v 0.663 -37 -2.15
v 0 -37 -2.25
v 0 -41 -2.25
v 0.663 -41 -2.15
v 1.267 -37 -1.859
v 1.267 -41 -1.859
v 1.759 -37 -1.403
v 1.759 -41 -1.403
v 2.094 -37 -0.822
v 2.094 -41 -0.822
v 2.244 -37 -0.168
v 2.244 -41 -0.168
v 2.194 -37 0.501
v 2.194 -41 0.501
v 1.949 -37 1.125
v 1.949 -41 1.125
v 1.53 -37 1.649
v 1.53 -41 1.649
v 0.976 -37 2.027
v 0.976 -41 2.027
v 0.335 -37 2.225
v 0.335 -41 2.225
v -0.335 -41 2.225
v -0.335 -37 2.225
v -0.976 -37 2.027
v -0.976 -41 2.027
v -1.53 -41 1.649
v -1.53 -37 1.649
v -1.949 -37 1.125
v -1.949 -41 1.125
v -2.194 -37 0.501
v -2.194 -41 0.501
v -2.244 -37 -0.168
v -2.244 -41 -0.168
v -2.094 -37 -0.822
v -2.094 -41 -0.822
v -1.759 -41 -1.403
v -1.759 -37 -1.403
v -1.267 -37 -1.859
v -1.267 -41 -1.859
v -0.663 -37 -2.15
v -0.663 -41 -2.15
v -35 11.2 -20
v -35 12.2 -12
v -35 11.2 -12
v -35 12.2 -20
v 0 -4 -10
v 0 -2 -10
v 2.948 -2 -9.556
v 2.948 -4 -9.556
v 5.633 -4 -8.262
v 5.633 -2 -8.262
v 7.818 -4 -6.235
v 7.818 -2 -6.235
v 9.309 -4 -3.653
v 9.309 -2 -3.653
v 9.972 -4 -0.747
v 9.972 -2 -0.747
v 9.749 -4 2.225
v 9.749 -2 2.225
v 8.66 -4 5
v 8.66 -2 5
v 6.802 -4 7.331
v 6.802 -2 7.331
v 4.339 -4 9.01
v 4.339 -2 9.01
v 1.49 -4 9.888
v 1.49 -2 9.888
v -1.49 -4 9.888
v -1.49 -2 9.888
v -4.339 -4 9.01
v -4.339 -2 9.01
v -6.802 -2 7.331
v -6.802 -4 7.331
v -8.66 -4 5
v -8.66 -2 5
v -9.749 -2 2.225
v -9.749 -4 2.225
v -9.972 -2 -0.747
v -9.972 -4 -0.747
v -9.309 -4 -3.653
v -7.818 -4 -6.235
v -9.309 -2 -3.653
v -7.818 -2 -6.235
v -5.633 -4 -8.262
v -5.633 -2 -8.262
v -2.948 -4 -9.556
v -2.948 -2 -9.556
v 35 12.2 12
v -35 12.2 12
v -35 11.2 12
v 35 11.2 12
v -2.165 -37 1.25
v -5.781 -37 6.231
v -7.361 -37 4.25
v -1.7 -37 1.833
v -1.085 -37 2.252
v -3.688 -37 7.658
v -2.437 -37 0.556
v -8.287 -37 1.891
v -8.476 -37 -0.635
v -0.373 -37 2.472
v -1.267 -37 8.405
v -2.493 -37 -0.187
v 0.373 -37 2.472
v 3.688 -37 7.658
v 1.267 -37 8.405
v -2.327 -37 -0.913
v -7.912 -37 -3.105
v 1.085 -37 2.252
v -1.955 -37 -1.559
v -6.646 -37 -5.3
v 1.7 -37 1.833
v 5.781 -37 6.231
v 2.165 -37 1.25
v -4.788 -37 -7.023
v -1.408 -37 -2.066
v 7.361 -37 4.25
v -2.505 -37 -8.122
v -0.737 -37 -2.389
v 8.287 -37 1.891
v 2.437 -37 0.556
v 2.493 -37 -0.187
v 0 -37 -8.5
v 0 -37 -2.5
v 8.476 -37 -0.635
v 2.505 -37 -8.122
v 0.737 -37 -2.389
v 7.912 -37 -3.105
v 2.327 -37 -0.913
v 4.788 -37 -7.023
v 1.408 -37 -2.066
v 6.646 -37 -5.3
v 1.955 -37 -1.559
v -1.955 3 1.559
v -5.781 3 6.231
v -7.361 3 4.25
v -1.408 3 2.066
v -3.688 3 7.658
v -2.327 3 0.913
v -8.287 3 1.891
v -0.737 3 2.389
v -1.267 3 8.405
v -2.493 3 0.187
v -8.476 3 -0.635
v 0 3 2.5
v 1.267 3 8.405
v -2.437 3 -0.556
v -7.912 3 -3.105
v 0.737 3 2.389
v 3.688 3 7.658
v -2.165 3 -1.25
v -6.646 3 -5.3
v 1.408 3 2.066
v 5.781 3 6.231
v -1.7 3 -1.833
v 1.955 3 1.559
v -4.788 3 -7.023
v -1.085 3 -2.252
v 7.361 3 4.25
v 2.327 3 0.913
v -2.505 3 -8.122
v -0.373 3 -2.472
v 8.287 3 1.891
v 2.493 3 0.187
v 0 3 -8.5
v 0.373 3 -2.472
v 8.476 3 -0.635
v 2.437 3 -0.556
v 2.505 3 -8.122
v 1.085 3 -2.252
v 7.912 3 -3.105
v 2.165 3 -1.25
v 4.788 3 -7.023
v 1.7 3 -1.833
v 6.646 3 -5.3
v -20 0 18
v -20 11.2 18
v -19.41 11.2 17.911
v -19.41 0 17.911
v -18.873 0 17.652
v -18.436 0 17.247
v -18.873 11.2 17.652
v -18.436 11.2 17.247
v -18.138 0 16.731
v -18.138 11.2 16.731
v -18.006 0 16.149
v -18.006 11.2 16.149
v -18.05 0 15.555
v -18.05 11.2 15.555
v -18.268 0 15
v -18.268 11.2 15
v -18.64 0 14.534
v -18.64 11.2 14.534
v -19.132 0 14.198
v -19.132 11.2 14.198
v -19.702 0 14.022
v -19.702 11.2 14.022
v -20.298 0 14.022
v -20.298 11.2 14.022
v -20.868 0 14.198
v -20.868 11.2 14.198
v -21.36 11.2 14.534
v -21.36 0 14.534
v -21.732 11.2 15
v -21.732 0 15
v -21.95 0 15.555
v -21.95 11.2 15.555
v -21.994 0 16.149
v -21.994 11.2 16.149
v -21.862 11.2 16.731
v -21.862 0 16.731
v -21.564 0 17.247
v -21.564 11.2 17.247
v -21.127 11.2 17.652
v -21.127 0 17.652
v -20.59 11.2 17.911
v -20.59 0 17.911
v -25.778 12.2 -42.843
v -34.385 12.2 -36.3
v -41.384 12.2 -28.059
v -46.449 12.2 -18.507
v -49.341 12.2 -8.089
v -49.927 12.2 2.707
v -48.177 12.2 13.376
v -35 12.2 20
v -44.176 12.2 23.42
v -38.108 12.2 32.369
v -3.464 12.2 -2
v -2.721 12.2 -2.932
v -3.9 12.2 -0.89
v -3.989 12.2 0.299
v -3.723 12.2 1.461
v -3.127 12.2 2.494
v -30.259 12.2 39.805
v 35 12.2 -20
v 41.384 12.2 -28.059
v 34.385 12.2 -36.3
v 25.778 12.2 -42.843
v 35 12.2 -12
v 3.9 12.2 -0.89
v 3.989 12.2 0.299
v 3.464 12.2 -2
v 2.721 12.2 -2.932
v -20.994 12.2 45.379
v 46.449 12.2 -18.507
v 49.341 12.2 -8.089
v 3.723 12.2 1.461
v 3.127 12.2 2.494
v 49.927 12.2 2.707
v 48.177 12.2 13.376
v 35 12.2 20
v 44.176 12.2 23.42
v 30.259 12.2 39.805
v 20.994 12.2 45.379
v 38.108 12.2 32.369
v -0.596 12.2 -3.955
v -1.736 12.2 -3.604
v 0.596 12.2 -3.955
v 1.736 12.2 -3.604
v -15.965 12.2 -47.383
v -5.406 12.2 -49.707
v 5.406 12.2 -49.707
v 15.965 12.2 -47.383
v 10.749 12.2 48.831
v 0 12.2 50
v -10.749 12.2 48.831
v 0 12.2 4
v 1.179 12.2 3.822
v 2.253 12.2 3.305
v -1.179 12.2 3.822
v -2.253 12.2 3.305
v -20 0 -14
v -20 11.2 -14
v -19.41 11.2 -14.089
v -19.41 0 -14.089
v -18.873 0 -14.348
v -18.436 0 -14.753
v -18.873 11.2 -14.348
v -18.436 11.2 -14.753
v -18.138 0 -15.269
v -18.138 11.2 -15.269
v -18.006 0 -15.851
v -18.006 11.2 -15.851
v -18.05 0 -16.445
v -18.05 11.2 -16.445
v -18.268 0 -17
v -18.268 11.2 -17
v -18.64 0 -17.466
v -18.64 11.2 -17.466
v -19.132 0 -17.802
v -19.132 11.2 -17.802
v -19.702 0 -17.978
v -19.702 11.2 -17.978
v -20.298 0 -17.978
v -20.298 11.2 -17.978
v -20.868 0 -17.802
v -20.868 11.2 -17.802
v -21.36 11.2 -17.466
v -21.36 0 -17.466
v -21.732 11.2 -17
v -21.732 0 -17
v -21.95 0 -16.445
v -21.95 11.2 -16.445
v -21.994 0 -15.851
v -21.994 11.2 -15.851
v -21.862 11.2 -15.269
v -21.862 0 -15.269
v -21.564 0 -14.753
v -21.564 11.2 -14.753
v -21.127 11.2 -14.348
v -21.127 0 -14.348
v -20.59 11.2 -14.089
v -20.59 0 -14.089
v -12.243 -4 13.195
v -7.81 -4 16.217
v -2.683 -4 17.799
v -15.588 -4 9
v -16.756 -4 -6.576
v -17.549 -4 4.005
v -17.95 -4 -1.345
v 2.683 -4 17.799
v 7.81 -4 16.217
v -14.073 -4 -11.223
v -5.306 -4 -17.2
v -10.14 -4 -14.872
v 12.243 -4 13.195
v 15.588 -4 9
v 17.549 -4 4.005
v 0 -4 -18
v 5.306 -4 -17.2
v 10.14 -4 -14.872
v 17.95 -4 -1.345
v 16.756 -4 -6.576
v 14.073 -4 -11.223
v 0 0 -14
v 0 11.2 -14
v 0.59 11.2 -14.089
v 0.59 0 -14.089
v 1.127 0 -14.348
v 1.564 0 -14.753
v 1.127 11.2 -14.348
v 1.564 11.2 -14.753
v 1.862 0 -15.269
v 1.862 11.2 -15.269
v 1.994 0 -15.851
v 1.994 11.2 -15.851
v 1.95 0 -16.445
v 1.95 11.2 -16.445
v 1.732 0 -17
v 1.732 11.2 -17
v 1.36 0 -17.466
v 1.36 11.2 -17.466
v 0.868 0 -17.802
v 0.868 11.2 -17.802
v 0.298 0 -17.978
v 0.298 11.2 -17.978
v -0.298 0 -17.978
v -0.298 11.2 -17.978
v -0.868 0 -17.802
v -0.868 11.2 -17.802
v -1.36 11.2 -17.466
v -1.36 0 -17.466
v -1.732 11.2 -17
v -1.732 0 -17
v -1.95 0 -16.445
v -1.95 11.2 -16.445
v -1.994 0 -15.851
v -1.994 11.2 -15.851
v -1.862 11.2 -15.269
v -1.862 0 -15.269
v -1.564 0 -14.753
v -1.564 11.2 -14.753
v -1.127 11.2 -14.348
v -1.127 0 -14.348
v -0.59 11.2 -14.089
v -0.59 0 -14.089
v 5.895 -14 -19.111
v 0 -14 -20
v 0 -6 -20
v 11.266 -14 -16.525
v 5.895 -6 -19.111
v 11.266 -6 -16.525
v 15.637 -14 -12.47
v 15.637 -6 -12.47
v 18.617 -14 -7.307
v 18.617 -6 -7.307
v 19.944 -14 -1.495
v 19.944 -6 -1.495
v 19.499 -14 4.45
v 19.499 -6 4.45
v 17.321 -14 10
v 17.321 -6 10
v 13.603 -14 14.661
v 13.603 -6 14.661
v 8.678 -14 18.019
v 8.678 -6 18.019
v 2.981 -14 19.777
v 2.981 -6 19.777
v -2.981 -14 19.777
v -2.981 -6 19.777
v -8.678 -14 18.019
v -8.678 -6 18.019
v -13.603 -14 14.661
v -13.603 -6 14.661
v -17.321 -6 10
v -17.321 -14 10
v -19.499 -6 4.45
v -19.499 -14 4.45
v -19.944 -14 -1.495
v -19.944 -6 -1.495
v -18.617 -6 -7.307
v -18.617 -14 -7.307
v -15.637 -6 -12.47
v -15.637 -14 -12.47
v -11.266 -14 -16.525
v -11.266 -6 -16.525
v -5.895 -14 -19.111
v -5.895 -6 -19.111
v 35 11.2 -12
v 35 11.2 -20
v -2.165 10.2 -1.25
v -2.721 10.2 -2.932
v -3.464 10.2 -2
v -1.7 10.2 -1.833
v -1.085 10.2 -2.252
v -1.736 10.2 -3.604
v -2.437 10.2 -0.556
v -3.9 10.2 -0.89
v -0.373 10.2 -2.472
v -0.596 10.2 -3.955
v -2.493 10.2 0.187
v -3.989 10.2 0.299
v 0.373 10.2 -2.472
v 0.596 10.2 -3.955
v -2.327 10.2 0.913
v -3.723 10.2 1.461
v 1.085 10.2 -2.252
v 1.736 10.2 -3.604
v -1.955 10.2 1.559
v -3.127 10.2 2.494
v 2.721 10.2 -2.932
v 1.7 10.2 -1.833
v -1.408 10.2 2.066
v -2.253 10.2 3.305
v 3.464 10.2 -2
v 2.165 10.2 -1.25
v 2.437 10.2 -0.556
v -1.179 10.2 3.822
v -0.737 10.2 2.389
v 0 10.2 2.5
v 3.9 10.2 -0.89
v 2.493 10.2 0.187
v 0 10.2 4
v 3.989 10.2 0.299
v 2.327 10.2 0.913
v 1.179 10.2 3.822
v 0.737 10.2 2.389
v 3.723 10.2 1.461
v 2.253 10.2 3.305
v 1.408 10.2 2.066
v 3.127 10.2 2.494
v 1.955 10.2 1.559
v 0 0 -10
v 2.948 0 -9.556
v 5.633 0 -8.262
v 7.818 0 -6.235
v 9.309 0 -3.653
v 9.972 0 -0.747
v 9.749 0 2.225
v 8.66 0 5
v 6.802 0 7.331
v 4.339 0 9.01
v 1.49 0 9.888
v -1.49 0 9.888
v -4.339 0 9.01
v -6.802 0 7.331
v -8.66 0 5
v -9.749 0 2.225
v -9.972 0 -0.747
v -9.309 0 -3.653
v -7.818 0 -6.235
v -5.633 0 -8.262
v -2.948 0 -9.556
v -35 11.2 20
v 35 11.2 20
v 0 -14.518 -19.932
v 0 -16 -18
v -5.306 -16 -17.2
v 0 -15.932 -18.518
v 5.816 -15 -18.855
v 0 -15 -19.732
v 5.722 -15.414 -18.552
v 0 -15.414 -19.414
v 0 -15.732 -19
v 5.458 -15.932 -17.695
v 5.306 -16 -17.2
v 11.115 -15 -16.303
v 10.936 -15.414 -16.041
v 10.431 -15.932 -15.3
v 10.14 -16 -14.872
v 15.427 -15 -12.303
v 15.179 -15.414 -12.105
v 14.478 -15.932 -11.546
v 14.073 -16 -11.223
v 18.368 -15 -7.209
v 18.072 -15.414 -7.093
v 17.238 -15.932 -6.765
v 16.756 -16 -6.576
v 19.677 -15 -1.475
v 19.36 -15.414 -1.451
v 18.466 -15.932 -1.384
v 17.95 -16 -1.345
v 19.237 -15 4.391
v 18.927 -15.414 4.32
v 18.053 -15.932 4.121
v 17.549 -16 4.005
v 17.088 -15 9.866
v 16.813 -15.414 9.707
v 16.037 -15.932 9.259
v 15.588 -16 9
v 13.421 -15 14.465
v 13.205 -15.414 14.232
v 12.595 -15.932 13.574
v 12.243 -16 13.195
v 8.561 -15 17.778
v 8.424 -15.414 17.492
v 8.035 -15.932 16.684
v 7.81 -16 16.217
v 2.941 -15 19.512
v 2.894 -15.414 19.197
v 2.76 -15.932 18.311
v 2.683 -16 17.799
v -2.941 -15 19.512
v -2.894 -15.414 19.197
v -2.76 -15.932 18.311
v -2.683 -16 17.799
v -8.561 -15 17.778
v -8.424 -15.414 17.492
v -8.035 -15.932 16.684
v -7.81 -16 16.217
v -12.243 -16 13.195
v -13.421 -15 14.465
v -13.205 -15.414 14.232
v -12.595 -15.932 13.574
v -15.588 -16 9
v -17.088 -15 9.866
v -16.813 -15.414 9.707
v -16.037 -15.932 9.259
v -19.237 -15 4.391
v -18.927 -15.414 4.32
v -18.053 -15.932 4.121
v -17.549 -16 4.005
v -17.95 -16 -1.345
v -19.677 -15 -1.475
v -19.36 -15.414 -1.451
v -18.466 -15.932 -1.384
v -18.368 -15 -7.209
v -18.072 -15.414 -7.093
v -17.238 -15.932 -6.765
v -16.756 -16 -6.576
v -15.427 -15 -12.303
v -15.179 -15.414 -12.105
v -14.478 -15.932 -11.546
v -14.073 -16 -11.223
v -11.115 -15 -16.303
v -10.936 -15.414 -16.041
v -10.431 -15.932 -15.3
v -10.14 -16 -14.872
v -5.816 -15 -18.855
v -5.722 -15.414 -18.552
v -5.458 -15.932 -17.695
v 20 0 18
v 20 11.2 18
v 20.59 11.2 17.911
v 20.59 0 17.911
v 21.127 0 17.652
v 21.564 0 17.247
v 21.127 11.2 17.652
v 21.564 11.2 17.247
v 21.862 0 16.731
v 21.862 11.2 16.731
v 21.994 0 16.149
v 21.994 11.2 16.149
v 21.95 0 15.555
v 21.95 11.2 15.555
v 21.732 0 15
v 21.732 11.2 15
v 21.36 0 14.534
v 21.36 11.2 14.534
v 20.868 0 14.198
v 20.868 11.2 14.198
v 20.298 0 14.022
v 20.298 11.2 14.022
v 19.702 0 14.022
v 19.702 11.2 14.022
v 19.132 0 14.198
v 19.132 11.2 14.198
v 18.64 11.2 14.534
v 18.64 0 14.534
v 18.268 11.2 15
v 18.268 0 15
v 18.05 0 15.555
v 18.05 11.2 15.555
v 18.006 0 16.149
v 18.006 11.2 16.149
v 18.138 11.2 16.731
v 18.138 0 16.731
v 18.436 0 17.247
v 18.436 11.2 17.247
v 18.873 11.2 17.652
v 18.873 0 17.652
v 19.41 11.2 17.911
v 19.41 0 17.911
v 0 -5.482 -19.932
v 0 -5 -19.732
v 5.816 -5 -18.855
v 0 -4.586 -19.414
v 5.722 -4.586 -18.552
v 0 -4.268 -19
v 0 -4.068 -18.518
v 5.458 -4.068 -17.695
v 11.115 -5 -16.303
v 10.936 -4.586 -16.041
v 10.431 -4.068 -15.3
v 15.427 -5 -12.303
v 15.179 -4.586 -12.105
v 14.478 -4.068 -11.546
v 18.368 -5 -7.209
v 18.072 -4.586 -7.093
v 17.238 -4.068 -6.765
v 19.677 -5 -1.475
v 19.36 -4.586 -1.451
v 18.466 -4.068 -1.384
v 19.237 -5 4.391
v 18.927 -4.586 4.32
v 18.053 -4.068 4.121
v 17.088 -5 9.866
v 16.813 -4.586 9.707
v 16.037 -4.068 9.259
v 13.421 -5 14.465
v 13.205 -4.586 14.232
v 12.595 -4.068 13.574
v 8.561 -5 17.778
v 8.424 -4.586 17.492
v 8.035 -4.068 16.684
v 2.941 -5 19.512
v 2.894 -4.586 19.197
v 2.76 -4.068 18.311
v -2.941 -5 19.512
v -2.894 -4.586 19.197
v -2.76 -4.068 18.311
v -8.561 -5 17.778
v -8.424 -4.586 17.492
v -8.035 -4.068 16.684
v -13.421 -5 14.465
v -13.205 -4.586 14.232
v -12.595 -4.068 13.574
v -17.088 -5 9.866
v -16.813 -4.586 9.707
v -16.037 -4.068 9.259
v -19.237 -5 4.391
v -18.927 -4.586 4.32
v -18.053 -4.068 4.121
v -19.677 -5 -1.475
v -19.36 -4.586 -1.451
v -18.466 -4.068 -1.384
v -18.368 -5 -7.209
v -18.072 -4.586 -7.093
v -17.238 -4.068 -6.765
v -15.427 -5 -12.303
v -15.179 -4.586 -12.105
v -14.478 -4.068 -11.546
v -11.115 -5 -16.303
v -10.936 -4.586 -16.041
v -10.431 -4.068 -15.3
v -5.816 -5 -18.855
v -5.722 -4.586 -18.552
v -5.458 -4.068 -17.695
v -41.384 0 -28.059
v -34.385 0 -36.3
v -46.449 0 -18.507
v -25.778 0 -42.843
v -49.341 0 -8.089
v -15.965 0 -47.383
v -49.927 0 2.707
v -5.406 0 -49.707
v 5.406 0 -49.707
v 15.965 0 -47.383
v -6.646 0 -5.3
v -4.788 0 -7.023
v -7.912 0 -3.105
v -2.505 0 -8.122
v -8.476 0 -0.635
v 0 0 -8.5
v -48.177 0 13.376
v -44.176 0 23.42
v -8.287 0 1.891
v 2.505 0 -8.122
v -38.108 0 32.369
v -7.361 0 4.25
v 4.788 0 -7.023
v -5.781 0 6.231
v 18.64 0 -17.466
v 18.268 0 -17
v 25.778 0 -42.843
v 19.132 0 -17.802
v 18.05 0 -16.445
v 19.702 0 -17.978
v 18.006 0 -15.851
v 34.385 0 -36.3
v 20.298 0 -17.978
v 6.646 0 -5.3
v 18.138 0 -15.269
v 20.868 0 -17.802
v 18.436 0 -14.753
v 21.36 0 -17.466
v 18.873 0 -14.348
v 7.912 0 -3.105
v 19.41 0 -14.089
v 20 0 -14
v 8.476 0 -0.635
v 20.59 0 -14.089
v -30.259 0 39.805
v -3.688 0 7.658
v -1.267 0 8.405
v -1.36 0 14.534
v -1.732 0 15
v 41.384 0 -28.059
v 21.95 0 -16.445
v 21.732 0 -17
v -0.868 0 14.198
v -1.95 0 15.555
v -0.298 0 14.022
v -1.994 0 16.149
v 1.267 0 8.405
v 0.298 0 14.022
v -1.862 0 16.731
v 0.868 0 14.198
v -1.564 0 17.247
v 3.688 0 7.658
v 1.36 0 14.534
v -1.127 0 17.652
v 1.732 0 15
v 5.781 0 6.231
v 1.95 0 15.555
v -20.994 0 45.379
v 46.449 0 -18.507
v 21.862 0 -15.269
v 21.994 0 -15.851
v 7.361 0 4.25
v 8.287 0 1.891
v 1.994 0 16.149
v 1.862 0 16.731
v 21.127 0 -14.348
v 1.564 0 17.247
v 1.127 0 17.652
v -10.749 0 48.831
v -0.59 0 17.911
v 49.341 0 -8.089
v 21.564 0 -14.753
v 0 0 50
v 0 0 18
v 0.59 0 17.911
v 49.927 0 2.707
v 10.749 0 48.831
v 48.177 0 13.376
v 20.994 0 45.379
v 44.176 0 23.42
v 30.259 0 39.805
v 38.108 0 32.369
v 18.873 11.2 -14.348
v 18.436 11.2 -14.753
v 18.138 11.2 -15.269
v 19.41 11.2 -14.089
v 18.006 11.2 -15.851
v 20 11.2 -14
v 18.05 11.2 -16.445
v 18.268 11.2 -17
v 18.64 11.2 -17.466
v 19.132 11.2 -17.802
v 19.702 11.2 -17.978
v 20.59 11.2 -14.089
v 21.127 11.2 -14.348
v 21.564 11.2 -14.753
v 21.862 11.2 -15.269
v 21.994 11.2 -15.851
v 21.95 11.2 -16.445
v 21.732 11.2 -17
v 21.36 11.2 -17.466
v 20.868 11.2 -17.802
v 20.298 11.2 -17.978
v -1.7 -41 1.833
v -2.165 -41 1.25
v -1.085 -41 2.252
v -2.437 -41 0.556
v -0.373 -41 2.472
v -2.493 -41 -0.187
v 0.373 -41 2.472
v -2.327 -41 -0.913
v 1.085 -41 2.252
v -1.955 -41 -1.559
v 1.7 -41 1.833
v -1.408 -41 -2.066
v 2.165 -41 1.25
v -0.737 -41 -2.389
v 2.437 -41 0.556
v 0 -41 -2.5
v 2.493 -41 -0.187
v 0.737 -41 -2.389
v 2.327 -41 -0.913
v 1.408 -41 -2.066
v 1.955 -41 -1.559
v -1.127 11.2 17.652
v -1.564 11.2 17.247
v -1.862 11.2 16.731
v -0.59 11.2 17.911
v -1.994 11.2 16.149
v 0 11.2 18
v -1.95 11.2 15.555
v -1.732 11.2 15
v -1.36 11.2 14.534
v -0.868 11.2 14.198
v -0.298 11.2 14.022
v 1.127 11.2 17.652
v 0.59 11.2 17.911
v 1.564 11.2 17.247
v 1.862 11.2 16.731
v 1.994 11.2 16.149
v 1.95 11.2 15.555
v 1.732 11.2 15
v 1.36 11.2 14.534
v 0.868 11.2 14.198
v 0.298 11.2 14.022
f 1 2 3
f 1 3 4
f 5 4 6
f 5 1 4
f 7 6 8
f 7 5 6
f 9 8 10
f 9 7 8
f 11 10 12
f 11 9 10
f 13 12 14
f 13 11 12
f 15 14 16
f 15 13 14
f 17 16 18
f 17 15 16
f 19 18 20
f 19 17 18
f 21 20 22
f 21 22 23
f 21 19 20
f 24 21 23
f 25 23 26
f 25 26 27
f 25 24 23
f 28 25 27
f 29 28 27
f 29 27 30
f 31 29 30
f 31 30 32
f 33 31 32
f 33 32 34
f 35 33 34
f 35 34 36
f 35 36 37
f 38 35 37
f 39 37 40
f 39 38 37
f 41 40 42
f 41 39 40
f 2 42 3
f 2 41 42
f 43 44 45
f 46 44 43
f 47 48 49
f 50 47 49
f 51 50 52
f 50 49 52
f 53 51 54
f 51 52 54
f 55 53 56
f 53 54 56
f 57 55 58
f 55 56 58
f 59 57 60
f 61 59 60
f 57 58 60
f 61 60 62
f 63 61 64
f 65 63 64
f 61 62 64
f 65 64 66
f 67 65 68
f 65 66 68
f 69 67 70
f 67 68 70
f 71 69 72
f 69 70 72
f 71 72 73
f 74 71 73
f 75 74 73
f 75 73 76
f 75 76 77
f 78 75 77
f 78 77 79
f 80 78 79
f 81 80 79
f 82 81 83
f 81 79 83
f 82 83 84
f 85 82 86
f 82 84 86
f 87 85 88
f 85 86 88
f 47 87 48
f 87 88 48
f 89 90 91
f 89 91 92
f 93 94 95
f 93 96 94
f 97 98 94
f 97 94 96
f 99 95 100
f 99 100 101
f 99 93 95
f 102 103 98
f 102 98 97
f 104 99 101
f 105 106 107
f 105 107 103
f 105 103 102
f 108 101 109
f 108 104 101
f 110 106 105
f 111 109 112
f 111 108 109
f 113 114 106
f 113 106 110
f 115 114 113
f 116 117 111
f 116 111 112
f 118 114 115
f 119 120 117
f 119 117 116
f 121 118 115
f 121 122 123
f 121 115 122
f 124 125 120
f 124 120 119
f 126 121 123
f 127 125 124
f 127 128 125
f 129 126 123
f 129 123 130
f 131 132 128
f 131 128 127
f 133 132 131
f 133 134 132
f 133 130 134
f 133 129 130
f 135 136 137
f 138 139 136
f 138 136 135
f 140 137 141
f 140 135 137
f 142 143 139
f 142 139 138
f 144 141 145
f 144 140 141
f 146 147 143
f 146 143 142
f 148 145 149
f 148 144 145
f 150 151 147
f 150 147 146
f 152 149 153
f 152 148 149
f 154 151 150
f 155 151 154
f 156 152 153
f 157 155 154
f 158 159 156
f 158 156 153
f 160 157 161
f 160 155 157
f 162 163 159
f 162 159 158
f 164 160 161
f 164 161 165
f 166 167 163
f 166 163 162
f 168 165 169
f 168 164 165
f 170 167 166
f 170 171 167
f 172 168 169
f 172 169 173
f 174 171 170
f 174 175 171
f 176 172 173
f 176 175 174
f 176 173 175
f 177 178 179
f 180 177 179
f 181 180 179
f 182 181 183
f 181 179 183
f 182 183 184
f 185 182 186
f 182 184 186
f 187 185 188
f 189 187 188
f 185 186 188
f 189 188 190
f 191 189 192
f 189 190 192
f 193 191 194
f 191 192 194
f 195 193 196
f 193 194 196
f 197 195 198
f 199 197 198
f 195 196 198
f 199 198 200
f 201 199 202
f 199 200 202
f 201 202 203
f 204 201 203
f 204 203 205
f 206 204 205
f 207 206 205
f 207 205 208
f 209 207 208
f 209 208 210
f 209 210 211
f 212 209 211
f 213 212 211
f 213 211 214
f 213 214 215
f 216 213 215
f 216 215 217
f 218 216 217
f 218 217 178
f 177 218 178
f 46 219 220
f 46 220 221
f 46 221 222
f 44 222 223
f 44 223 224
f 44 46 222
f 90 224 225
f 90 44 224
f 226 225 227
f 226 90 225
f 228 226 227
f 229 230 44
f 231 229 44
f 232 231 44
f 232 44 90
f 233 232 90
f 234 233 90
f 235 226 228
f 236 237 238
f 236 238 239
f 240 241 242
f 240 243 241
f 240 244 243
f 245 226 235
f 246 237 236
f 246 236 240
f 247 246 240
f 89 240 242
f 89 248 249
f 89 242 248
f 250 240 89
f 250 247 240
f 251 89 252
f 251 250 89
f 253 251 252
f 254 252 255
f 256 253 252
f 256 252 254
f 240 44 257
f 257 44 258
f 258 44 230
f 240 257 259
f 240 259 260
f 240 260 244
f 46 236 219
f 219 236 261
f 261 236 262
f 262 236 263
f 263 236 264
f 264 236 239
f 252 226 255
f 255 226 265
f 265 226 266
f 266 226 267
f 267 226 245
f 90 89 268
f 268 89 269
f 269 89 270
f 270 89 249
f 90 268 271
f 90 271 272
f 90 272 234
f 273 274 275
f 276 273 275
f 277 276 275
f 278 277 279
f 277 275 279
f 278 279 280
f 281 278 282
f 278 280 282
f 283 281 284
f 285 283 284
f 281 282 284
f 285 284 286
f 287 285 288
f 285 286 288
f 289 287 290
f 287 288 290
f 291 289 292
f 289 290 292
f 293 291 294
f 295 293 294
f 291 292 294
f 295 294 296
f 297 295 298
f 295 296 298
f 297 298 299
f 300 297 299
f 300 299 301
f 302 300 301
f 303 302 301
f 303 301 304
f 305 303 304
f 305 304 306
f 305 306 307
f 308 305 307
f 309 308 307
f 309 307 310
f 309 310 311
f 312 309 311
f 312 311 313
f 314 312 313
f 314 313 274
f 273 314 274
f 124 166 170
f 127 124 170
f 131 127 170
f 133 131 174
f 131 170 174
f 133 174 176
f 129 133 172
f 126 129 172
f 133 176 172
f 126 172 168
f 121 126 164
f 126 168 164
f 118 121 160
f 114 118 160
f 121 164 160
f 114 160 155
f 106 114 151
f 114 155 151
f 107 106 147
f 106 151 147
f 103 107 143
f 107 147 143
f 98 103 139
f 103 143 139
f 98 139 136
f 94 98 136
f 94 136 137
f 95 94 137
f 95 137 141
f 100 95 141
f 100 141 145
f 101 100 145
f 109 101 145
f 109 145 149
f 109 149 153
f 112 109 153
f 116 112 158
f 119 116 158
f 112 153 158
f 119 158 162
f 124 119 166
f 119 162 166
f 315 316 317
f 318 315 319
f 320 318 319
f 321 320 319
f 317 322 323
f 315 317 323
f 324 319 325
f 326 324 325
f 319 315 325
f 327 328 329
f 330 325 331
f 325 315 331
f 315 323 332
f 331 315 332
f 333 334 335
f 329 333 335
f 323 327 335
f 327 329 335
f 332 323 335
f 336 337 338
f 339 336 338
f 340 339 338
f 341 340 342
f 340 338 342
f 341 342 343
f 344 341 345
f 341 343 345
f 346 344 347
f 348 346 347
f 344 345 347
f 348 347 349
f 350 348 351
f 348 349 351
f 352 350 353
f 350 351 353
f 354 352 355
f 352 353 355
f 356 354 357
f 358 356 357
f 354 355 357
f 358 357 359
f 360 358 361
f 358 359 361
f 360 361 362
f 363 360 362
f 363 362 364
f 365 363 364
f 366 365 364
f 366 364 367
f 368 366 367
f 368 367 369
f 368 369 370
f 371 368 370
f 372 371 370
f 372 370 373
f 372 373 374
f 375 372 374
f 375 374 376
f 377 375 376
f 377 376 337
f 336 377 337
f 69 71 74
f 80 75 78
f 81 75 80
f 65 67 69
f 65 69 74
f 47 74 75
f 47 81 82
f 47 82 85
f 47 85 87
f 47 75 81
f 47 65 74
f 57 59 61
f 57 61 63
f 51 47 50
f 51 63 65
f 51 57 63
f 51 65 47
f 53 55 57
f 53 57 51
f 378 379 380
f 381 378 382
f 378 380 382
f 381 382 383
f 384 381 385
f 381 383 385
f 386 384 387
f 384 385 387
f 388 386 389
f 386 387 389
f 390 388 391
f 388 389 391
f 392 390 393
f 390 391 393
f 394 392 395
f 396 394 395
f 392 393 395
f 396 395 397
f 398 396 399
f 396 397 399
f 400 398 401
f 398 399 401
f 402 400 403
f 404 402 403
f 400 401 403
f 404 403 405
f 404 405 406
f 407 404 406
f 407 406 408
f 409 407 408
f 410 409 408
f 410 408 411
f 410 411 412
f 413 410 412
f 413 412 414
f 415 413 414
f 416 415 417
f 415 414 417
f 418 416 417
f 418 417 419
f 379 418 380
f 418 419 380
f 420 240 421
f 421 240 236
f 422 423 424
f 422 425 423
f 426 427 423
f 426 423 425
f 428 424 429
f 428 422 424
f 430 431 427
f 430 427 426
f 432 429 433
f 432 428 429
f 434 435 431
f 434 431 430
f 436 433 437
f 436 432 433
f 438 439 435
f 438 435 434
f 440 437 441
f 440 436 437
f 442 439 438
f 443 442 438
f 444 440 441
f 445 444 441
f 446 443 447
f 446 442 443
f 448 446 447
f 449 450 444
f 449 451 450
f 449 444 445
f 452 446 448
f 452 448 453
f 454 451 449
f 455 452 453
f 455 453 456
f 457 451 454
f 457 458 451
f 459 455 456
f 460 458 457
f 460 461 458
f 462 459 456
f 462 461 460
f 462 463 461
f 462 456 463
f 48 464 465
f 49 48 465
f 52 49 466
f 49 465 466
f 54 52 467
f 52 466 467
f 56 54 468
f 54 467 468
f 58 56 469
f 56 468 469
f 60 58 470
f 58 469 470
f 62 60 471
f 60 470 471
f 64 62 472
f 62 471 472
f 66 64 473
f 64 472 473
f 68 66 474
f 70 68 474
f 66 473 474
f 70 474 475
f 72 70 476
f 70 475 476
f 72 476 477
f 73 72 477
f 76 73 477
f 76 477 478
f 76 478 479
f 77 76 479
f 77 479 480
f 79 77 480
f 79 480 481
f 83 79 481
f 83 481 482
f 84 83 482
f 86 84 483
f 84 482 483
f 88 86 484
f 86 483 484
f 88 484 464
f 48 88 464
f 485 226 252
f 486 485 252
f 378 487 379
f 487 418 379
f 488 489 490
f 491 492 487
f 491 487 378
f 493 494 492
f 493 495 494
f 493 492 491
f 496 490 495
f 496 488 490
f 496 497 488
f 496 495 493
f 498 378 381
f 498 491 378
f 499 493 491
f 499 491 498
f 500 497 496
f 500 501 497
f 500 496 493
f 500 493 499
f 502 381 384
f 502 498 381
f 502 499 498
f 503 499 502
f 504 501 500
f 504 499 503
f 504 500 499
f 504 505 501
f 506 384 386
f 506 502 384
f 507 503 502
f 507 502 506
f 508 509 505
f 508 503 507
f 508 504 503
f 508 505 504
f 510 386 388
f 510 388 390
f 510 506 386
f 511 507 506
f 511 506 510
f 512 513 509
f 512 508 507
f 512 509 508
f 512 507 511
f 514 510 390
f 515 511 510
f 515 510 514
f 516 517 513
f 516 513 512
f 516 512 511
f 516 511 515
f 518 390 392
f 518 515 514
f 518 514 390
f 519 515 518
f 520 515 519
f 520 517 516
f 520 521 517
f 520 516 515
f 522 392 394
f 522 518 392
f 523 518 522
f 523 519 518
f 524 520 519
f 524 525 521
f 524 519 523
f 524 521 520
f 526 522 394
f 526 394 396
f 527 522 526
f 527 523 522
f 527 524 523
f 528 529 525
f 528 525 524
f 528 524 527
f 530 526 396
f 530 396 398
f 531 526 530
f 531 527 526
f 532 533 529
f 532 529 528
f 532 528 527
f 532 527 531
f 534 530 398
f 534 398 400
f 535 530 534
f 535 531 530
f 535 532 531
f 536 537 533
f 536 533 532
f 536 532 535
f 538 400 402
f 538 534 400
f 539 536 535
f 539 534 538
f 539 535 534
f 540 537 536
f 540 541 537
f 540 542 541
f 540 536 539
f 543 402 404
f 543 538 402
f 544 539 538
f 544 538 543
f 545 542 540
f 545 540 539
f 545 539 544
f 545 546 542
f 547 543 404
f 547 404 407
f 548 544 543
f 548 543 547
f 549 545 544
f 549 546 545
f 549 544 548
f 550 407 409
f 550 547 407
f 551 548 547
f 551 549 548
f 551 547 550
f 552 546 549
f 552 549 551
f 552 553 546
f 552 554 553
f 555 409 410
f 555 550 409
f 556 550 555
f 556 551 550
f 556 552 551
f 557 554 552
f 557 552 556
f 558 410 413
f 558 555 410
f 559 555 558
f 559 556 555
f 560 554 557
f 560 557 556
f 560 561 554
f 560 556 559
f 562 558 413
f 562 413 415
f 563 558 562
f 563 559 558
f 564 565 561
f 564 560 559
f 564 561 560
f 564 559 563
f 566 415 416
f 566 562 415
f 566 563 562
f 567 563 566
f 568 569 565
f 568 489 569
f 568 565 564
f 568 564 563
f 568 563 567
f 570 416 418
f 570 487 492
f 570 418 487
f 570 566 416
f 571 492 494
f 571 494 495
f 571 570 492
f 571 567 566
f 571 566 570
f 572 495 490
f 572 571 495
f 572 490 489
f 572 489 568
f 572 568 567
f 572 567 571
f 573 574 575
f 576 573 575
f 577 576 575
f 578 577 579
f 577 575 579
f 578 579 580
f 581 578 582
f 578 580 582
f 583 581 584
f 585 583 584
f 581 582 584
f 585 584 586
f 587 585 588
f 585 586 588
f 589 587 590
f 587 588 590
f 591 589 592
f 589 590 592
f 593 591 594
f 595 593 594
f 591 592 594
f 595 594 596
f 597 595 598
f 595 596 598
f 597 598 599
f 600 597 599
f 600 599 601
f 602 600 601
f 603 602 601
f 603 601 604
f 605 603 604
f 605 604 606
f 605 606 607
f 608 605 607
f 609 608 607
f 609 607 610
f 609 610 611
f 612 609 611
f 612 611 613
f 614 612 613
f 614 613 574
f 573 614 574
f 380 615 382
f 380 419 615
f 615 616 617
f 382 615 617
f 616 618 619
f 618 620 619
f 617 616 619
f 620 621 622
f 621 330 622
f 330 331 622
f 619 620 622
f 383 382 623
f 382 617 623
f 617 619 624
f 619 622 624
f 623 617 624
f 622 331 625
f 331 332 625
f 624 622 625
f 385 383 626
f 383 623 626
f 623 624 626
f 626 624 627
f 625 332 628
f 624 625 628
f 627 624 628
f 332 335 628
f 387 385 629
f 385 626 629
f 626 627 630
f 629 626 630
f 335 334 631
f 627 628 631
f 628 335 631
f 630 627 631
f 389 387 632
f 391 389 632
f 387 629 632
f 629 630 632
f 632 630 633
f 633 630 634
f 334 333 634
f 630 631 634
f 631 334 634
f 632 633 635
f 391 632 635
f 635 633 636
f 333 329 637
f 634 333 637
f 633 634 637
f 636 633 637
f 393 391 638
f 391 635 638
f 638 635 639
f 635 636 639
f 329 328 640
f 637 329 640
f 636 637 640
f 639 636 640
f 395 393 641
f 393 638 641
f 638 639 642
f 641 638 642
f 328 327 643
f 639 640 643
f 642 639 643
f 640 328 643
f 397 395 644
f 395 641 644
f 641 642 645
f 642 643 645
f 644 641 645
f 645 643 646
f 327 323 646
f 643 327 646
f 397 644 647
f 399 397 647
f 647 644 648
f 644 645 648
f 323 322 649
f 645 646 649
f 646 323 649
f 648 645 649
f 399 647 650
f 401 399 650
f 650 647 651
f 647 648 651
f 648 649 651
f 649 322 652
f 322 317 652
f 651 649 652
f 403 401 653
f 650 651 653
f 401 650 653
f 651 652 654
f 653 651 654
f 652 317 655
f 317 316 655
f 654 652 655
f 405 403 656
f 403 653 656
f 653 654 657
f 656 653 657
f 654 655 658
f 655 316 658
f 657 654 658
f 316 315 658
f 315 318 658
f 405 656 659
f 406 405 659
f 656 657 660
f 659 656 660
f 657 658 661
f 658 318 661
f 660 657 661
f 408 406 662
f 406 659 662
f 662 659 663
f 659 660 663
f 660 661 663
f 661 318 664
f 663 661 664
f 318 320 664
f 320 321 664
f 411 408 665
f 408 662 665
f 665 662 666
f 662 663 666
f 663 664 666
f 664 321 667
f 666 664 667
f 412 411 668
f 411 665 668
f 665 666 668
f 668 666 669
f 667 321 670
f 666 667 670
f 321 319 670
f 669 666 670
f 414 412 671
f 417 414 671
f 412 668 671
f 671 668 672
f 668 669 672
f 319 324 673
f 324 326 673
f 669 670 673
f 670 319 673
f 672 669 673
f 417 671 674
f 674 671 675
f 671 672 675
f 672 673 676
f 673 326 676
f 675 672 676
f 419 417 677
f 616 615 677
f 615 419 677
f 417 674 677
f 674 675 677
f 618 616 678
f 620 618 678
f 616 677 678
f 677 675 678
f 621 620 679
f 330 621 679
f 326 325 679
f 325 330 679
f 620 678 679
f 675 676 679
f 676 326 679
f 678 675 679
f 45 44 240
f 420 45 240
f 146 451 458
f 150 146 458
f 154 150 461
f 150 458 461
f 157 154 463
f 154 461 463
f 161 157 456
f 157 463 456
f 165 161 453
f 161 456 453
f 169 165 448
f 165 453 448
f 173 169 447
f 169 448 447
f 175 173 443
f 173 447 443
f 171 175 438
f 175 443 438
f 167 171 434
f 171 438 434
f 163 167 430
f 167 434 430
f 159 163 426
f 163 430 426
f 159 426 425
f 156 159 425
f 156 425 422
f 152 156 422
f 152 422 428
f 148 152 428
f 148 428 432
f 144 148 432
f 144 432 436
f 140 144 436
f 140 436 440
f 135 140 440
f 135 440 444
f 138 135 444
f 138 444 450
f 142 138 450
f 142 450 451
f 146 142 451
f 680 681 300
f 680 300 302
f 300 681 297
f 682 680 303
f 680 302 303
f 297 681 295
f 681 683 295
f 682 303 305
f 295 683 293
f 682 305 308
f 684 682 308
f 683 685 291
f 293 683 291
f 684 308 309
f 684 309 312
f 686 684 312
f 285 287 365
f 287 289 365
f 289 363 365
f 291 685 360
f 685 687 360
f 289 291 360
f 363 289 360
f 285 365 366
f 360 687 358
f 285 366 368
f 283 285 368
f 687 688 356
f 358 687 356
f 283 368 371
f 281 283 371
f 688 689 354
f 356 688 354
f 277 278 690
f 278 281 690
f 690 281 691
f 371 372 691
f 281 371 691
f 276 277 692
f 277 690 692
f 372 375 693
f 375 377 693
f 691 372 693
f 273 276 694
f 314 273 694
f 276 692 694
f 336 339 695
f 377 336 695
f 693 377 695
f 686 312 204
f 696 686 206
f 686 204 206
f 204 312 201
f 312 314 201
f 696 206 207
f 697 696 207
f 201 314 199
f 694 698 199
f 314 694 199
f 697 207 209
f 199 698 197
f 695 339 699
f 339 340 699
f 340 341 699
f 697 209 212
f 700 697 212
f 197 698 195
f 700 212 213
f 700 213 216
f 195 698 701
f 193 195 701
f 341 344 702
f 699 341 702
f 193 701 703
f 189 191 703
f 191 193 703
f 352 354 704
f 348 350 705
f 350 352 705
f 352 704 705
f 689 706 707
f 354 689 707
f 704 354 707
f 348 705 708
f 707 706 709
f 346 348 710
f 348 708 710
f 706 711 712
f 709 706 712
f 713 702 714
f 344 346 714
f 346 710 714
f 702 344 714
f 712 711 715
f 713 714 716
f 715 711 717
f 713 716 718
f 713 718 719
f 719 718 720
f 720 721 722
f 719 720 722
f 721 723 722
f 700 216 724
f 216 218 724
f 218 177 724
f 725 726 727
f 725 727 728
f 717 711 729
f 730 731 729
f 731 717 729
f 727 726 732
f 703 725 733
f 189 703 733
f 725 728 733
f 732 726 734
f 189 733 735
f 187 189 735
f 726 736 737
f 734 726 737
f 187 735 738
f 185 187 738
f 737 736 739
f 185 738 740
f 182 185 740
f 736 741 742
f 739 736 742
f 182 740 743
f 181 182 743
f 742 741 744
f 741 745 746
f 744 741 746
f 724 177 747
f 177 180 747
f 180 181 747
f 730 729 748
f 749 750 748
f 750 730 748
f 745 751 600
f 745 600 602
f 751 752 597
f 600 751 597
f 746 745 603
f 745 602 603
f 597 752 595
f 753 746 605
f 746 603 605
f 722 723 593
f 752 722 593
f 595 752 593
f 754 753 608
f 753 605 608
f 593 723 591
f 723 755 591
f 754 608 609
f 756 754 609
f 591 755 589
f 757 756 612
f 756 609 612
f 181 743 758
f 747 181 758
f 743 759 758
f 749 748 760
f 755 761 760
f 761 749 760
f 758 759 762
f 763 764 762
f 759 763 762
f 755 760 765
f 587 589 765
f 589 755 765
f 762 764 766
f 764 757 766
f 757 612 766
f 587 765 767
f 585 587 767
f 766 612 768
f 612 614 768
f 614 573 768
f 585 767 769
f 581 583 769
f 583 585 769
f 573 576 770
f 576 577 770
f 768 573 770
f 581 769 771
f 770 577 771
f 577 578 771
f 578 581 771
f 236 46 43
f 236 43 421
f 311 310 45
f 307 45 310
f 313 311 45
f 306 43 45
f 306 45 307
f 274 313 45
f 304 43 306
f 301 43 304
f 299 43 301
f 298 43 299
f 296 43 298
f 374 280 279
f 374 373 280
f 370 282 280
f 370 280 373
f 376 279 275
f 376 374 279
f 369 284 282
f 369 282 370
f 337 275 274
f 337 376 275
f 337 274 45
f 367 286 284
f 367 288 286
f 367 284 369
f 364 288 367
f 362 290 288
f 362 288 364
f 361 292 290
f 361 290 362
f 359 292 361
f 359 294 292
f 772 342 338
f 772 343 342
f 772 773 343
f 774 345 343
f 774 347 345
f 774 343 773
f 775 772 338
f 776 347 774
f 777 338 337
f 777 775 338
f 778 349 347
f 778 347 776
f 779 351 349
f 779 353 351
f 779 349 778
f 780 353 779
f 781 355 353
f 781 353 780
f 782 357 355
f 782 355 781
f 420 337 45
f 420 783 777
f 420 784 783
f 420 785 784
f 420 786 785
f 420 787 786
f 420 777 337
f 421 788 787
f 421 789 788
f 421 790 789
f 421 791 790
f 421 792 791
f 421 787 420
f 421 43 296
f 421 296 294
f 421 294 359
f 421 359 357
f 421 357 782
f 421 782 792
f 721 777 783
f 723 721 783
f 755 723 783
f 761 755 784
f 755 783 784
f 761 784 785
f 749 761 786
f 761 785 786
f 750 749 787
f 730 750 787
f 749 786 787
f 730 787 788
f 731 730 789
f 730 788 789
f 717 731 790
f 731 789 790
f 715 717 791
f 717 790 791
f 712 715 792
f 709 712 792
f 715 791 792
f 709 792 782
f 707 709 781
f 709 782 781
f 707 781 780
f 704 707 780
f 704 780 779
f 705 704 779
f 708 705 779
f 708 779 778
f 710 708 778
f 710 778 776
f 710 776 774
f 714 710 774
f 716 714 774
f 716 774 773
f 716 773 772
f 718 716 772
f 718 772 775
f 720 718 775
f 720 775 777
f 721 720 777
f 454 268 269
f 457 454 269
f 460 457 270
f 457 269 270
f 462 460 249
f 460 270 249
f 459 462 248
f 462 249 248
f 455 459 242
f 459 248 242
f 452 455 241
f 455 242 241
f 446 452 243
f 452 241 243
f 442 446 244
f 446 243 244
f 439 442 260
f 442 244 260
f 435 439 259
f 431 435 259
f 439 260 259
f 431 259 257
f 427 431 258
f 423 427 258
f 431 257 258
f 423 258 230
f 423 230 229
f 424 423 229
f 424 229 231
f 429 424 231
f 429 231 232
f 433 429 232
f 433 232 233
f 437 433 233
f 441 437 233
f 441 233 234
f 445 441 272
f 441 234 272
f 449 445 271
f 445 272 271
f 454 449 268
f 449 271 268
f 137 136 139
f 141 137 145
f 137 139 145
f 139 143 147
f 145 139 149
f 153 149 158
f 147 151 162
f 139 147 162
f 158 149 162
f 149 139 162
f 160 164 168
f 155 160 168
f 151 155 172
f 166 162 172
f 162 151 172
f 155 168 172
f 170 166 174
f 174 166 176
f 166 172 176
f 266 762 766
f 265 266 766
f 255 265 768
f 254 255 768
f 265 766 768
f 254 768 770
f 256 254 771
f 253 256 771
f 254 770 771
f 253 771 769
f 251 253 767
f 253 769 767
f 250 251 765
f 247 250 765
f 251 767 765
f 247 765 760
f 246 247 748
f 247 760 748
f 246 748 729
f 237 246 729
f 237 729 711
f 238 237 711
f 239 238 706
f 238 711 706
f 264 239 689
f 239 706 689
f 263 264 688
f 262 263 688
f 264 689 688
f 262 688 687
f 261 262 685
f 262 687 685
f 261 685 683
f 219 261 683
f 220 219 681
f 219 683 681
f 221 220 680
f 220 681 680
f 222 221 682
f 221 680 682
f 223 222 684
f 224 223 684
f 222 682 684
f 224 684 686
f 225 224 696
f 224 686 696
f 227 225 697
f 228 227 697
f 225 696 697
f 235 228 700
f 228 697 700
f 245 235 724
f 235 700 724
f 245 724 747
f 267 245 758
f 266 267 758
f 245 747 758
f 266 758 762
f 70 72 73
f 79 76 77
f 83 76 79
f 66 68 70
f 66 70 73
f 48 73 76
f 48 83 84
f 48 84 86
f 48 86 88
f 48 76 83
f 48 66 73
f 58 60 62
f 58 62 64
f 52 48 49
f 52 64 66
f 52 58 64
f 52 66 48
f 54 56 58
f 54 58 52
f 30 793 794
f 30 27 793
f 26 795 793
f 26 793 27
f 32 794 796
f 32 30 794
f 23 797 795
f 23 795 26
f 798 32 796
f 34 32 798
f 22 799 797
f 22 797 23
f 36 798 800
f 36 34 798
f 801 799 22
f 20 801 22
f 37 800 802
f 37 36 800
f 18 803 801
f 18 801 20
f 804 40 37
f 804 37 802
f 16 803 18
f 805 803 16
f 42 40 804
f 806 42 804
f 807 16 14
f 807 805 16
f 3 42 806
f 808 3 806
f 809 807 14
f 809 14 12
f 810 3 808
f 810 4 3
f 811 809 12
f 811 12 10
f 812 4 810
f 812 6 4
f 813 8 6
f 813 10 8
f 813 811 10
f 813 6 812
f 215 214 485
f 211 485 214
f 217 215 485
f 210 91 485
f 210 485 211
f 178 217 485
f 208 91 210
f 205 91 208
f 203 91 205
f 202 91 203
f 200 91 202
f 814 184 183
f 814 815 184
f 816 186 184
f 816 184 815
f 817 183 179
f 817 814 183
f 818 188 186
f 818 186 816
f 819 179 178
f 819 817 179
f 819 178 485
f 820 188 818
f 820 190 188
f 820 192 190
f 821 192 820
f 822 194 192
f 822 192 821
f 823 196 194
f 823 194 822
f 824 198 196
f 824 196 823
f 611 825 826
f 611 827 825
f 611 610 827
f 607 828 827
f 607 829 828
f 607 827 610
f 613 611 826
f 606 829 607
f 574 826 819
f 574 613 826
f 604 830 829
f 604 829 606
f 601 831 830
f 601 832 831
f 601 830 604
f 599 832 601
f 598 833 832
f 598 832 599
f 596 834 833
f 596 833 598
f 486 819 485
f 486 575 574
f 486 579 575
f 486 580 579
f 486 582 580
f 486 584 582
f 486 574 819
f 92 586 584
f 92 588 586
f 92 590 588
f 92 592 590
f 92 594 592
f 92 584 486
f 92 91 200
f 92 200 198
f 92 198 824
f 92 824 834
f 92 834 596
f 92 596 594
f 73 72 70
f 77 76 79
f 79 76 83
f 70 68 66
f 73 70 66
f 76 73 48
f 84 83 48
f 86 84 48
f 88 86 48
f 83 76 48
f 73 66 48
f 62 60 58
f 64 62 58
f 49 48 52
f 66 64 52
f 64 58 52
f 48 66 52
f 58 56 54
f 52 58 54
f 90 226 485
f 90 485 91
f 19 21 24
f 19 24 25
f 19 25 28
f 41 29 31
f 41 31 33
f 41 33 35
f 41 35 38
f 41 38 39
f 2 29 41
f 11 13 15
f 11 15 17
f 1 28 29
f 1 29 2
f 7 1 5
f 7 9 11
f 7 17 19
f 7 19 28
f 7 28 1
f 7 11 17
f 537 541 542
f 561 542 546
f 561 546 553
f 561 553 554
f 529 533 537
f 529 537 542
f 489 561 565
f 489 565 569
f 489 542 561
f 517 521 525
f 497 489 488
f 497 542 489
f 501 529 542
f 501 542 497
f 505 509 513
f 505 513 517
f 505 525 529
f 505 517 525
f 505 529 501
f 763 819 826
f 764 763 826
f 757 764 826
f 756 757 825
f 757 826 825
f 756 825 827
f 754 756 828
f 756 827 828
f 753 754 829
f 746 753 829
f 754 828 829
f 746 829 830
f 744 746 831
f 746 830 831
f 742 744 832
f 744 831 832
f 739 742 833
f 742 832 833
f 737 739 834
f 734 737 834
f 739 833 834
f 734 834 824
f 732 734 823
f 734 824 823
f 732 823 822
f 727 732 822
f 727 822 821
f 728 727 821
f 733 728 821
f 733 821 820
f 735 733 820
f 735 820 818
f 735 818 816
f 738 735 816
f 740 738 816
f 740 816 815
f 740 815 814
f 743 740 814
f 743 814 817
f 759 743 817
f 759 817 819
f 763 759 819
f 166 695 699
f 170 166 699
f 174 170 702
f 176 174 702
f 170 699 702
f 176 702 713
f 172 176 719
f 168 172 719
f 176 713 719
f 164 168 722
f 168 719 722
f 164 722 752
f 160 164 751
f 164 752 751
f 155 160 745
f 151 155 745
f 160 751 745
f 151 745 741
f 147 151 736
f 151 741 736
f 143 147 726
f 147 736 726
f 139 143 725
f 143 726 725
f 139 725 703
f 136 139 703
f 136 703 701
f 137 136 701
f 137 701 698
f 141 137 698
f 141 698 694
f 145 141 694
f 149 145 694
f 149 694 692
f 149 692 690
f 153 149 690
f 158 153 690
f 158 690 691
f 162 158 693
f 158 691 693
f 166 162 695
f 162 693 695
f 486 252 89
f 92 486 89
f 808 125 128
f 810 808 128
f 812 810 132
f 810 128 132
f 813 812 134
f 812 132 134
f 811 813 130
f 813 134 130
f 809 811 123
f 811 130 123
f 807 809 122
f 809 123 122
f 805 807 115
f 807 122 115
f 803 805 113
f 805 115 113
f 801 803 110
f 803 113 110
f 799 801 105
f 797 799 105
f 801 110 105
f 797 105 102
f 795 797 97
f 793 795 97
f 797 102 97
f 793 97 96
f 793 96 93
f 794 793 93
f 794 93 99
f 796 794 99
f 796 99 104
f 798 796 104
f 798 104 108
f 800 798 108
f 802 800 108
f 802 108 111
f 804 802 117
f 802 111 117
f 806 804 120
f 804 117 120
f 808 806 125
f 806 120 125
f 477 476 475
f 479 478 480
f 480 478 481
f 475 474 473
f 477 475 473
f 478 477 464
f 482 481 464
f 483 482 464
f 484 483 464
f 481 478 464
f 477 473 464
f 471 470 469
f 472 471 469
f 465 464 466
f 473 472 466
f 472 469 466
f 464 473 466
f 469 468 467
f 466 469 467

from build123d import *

# Parameters (mm, degrees)
SKETCH3_R            = 50
BOSS_EXTRUDE1_DEPTH  = 12.2
SKETCH4_W            = 70
SKETCH4_H            = 8
CUT_EXTRUDE2_DEPTH   = 1
SKETCH7_R            = 2
CUT_EXTRUDE4_DEPTH   = 72.755417914
SKETCH8_R            = 8.5
CUT_EXTRUDE6_DEPTH   = 3
SKETCH9_R            = 4
CUT_EXTRUDE7_DEPTH   = 2
SKETCH11_R           = 2.5
CUT_EXTRUDE8_DEPTH   = 72.442564344
SKETCH16_R           = 8.5
BOSS_EXTRUDE6_DEPTH  = 40
SKETCH21_R           = 10
BOSS_EXTRUDE11_DEPTH = 2
SKETCH22_R           = 10
BOSS_EXTRUDE12_DEPTH = 2
SKETCH23_R           = 20
BOSS_EXTRUDE13_DEPTH = 12
FILLET1_R            = 2
SKETCH24_R           = 2.5
SKETCH24_R_2         = 2.25
BOSS_EXTRUDE14_DEPTH = 4


with BuildPart() as part:
    # Sketch3 → Boss-Extrude1 (new body)
    with BuildSketch(Plane(origin=(0, 0, 0), x_dir=(1, 0, 0), z_dir=(0, 1, 0))):
        with Locations(Location((0, 0, 0), (0, 0, 270))):
            Circle(SKETCH3_R)
    extrude(amount=BOSS_EXTRUDE1_DEPTH)

    # Sketch4 → Cut-Extrude2 (cut)
    with BuildSketch(Plane(origin=(0, 12.2, 0), x_dir=(1, 0, 0), z_dir=(0, 1, 0))):
        with Locations((0, -16)):
            Rectangle(SKETCH4_W, SKETCH4_H)
        with Locations((0, 16)):
            Rectangle(SKETCH4_W, SKETCH4_H)
    extrude(amount=-CUT_EXTRUDE2_DEPTH, mode=Mode.SUBTRACT)

    # Sketch7 → Cut-Extrude4 (cut, through all)
    with BuildSketch(Plane(origin=(0, 12.2, 0), x_dir=(1, 0, 0), z_dir=(0, 1, 0))):
        with Locations(Location((0, 16, 0), (0, 0, 270))):
            Circle(SKETCH7_R)
        with Locations(Location((0, -16, 0), (0, 0, 270))):
            Circle(SKETCH7_R)
        with Locations(Location((-20, -16, 0), (0, 0, 270))):
            Circle(SKETCH7_R)
        with Locations(Location((-20, 16, 0), (0, 0, 270))):
            Circle(SKETCH7_R)
        with Locations(Location((20, 16, 0), (0, 0, 270))):
            Circle(SKETCH7_R)
        with Locations(Location((20, -16, 0), (0, 0, 270))):
            Circle(SKETCH7_R)
    extrude(amount=-CUT_EXTRUDE4_DEPTH, mode=Mode.SUBTRACT)

    # Sketch8 → Cut-Extrude6 (cut)
    with BuildSketch(Plane(origin=(0, 0, 0), x_dir=(-1, 0, 0), z_dir=(0, -1, 0))):
        with Locations(Location((0, 0, 0), (0, 0, 90))):
            Circle(SKETCH8_R)
    extrude(amount=-CUT_EXTRUDE6_DEPTH, mode=Mode.SUBTRACT)

    # Sketch9 → Cut-Extrude7 (cut)
    with BuildSketch(Plane(origin=(0, 12.2, 0), x_dir=(1, 0, 0), z_dir=(0, 1, 0))):
        with Locations(Location((0, 0, 0), (0, 0, 270))):
            Circle(SKETCH9_R)
    extrude(amount=-CUT_EXTRUDE7_DEPTH, mode=Mode.SUBTRACT)

    # Sketch11 → Cut-Extrude8 (cut, through all)
    with BuildSketch(Plane(origin=(0, 10.2, 0), x_dir=(1, 0, 0), z_dir=(0, 1, 0))):
        with Locations(Location((0, 0, 0), (0, 0, 270))):
            Circle(SKETCH11_R)
    extrude(amount=-CUT_EXTRUDE8_DEPTH, mode=Mode.SUBTRACT)


with BuildPart() as body_2:
    # Sketch16 → Boss-Extrude6 (new body)
    with BuildSketch(Plane.XZ.offset(-3)):
        with Locations(Location((0, 0, 0), (0, 0, 270))):
            Circle(SKETCH16_R)
    extrude(amount=BOSS_EXTRUDE6_DEPTH)

    # Sketch24 → Boss-Extrude14 (add)
    with BuildSketch(Plane(origin=(0, -37, 0), x_dir=(-1, 0, 0), z_dir=(0, -1, 0))):
        with Locations(Location((0, 0, 0), (0, 0, 90))):
            Circle(SKETCH24_R)
        with Locations(Location((0, 0, 0), (0, 0, 90))):
            Circle(SKETCH24_R_2, mode=Mode.SUBTRACT)
    extrude(amount=BOSS_EXTRUDE14_DEPTH)


with BuildPart() as body_3:
    # Sketch21 → Boss-Extrude11 (new body)
    with BuildSketch(Plane.XZ):
        with Locations(Location((0, 0, 0), (0, 0, 270))):
            Circle(SKETCH21_R)
    extrude(amount=BOSS_EXTRUDE11_DEPTH)


with BuildPart() as body_4:
    # Sketch22 → Boss-Extrude12 (new body)
    with BuildSketch(Plane.XZ.offset(2)):
        with Locations(Location((0, 0, 0), (0, 0, 270))):
            Circle(SKETCH22_R)
    extrude(amount=BOSS_EXTRUDE12_DEPTH)


with BuildPart() as body_5:
    # Sketch23 → Boss-Extrude13 (new body)
    with BuildSketch(Plane(origin=(0, -4, 0), x_dir=(-1, 0, 0), z_dir=(0, -1, 0))):
        with Locations(Location((0, 0, 0), (0, 0, 90))):
            Circle(SKETCH23_R)
    extrude(amount=BOSS_EXTRUDE13_DEPTH)

    # Fillet1
    fillet1_edges = [body_5.edges().sort_by_distance(p)[0] for p in [
        (0, -4, 20),
        (0, -16, 20),
    ]]
    fillet(fillet1_edges, radius=FILLET1_R)


solid = Compound([part.part, body_2.part, body_3.part, body_4.part, body_5.part])
